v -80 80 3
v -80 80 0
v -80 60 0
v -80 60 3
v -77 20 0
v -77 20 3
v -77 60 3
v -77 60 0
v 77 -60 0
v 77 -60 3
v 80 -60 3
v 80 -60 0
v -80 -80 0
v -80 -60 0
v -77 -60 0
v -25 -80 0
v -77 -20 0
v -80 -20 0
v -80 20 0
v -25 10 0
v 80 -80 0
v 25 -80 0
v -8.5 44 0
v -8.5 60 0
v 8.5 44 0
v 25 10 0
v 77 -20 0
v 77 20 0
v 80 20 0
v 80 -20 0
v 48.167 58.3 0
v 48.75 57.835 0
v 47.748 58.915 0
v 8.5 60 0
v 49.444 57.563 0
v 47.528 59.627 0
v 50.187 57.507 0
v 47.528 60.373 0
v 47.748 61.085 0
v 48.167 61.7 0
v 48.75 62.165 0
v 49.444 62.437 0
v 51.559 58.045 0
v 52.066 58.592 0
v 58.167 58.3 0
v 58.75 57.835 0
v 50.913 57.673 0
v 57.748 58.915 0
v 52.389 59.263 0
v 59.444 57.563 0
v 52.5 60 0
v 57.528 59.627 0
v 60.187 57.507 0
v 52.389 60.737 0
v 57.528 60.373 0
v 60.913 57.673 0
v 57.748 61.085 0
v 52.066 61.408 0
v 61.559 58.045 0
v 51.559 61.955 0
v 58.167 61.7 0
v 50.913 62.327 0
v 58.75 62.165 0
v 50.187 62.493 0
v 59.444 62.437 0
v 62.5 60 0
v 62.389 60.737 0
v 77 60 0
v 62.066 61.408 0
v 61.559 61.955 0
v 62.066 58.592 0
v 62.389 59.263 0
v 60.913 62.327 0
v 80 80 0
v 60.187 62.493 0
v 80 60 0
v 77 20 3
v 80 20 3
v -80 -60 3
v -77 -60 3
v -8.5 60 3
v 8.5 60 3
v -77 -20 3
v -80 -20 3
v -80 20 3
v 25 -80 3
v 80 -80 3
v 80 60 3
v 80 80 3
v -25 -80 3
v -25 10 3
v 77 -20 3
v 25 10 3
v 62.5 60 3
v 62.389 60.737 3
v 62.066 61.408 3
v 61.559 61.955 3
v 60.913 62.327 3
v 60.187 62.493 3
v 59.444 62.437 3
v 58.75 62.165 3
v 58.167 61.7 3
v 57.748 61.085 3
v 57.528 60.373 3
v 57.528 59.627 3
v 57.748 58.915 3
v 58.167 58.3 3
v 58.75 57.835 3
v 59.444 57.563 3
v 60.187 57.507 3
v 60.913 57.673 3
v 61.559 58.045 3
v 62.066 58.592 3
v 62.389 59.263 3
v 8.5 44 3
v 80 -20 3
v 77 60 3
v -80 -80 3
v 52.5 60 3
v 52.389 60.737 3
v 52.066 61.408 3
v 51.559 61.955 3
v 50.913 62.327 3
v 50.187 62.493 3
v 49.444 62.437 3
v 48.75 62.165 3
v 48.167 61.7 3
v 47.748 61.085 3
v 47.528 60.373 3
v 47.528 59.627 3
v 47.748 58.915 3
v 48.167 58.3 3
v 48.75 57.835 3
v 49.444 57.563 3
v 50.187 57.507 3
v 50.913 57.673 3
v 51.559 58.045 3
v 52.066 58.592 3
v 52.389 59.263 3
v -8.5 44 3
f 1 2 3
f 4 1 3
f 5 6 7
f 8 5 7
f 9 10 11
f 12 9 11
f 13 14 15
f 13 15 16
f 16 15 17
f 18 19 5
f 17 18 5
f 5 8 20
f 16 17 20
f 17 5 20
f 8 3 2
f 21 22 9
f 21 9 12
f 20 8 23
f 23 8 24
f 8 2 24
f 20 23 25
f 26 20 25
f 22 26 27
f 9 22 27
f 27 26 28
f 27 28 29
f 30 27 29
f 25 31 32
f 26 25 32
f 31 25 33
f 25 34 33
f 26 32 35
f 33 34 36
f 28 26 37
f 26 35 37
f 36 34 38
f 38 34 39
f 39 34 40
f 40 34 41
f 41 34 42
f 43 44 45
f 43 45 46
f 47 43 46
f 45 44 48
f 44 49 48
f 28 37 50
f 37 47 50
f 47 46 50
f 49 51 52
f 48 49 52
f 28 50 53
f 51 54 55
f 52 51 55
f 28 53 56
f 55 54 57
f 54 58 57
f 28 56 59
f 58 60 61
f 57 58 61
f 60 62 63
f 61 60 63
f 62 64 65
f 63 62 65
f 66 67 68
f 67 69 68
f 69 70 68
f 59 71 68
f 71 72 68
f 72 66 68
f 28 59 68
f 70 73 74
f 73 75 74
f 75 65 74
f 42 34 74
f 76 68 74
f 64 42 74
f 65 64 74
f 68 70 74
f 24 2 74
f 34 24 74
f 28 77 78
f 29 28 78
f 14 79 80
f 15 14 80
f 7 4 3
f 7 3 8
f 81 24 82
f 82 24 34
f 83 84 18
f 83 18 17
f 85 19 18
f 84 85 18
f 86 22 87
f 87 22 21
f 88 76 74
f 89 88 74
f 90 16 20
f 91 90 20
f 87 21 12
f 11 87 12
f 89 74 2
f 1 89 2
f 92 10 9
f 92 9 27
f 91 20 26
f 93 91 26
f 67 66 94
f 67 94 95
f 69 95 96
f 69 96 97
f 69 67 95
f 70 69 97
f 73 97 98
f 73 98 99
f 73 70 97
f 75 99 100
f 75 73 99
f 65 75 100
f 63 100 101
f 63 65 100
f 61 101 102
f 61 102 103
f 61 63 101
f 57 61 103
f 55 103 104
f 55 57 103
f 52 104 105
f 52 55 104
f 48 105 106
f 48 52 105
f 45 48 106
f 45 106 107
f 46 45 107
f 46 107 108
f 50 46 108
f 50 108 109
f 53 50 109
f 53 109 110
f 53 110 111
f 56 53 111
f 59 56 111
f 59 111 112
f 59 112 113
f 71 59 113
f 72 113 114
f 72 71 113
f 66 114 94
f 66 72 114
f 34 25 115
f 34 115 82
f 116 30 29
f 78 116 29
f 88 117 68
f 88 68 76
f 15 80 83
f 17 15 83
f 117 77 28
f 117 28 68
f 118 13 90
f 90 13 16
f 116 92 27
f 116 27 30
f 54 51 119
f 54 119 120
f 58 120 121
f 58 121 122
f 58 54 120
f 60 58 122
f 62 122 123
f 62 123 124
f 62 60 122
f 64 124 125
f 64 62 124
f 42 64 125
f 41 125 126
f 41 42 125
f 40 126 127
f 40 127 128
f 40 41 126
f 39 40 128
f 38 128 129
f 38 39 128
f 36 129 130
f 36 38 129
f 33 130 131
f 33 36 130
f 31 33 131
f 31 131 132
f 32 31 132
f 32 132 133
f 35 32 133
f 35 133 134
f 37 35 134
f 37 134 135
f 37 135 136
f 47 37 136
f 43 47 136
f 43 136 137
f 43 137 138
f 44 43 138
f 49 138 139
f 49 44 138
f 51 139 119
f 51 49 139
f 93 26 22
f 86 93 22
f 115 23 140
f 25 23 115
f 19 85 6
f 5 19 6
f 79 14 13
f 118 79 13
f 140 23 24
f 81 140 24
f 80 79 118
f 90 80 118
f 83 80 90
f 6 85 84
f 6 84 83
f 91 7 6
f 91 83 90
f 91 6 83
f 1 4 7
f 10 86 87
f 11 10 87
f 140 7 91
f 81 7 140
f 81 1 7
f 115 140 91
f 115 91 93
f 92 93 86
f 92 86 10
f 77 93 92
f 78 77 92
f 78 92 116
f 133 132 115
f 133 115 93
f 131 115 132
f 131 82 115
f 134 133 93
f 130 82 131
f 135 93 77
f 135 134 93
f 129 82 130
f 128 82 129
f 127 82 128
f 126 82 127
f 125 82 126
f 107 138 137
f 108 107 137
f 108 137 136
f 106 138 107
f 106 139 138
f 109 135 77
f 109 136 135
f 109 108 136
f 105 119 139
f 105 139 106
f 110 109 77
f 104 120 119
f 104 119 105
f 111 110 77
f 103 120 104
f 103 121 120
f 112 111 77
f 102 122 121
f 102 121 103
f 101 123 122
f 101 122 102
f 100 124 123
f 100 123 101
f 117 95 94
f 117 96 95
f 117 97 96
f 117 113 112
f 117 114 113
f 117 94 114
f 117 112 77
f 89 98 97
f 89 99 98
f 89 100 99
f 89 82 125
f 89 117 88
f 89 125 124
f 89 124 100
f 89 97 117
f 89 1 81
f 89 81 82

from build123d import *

# Parameters (mm, degrees)
SKETCH1_W           = 17
SKETCH1_H           = 16
SKETCH1_R           = 2.5
BOSS_EXTRUDE1_DEPTH = 3
SKETCH2_W           = 3
SKETCH2_H           = 40
CUT_EXTRUDE1_DEPTH  = 114.176852757


with BuildPart() as part:
    # Sketch1 → Boss-Extrude1 (new body)
    with BuildSketch(Plane.XY):
        Polygon((80, 80), (-80, 80), (-80, -80), (-25, -80), (-25, 10), (25, 10), (25, -80), (80, -80), align=None)
        with Locations((0, 52)):
            Rectangle(SKETCH1_W, SKETCH1_H, mode=Mode.SUBTRACT)
        with Locations((50, 60)):
            Circle(SKETCH1_R, mode=Mode.SUBTRACT)
        with Locations((60, 60)):
            Circle(SKETCH1_R, mode=Mode.SUBTRACT)
    extrude(amount=BOSS_EXTRUDE1_DEPTH)

    # Sketch2 → Cut-Extrude1 (cut, through all)
    with BuildSketch(Plane.XY.offset(3)):
        with Locations((-78.5, 40)):
            Rectangle(SKETCH2_W, SKETCH2_H)
        with Locations((-78.5, -40)):
            Rectangle(SKETCH2_W, SKETCH2_H)
        with Locations((78.5, -40)):
            Rectangle(SKETCH2_W, SKETCH2_H)
        with Locations((78.5, 40)):
            Rectangle(SKETCH2_W, SKETCH2_H)
    extrude(amount=-CUT_EXTRUDE1_DEPTH, mode=Mode.SUBTRACT)


solid = part.part
